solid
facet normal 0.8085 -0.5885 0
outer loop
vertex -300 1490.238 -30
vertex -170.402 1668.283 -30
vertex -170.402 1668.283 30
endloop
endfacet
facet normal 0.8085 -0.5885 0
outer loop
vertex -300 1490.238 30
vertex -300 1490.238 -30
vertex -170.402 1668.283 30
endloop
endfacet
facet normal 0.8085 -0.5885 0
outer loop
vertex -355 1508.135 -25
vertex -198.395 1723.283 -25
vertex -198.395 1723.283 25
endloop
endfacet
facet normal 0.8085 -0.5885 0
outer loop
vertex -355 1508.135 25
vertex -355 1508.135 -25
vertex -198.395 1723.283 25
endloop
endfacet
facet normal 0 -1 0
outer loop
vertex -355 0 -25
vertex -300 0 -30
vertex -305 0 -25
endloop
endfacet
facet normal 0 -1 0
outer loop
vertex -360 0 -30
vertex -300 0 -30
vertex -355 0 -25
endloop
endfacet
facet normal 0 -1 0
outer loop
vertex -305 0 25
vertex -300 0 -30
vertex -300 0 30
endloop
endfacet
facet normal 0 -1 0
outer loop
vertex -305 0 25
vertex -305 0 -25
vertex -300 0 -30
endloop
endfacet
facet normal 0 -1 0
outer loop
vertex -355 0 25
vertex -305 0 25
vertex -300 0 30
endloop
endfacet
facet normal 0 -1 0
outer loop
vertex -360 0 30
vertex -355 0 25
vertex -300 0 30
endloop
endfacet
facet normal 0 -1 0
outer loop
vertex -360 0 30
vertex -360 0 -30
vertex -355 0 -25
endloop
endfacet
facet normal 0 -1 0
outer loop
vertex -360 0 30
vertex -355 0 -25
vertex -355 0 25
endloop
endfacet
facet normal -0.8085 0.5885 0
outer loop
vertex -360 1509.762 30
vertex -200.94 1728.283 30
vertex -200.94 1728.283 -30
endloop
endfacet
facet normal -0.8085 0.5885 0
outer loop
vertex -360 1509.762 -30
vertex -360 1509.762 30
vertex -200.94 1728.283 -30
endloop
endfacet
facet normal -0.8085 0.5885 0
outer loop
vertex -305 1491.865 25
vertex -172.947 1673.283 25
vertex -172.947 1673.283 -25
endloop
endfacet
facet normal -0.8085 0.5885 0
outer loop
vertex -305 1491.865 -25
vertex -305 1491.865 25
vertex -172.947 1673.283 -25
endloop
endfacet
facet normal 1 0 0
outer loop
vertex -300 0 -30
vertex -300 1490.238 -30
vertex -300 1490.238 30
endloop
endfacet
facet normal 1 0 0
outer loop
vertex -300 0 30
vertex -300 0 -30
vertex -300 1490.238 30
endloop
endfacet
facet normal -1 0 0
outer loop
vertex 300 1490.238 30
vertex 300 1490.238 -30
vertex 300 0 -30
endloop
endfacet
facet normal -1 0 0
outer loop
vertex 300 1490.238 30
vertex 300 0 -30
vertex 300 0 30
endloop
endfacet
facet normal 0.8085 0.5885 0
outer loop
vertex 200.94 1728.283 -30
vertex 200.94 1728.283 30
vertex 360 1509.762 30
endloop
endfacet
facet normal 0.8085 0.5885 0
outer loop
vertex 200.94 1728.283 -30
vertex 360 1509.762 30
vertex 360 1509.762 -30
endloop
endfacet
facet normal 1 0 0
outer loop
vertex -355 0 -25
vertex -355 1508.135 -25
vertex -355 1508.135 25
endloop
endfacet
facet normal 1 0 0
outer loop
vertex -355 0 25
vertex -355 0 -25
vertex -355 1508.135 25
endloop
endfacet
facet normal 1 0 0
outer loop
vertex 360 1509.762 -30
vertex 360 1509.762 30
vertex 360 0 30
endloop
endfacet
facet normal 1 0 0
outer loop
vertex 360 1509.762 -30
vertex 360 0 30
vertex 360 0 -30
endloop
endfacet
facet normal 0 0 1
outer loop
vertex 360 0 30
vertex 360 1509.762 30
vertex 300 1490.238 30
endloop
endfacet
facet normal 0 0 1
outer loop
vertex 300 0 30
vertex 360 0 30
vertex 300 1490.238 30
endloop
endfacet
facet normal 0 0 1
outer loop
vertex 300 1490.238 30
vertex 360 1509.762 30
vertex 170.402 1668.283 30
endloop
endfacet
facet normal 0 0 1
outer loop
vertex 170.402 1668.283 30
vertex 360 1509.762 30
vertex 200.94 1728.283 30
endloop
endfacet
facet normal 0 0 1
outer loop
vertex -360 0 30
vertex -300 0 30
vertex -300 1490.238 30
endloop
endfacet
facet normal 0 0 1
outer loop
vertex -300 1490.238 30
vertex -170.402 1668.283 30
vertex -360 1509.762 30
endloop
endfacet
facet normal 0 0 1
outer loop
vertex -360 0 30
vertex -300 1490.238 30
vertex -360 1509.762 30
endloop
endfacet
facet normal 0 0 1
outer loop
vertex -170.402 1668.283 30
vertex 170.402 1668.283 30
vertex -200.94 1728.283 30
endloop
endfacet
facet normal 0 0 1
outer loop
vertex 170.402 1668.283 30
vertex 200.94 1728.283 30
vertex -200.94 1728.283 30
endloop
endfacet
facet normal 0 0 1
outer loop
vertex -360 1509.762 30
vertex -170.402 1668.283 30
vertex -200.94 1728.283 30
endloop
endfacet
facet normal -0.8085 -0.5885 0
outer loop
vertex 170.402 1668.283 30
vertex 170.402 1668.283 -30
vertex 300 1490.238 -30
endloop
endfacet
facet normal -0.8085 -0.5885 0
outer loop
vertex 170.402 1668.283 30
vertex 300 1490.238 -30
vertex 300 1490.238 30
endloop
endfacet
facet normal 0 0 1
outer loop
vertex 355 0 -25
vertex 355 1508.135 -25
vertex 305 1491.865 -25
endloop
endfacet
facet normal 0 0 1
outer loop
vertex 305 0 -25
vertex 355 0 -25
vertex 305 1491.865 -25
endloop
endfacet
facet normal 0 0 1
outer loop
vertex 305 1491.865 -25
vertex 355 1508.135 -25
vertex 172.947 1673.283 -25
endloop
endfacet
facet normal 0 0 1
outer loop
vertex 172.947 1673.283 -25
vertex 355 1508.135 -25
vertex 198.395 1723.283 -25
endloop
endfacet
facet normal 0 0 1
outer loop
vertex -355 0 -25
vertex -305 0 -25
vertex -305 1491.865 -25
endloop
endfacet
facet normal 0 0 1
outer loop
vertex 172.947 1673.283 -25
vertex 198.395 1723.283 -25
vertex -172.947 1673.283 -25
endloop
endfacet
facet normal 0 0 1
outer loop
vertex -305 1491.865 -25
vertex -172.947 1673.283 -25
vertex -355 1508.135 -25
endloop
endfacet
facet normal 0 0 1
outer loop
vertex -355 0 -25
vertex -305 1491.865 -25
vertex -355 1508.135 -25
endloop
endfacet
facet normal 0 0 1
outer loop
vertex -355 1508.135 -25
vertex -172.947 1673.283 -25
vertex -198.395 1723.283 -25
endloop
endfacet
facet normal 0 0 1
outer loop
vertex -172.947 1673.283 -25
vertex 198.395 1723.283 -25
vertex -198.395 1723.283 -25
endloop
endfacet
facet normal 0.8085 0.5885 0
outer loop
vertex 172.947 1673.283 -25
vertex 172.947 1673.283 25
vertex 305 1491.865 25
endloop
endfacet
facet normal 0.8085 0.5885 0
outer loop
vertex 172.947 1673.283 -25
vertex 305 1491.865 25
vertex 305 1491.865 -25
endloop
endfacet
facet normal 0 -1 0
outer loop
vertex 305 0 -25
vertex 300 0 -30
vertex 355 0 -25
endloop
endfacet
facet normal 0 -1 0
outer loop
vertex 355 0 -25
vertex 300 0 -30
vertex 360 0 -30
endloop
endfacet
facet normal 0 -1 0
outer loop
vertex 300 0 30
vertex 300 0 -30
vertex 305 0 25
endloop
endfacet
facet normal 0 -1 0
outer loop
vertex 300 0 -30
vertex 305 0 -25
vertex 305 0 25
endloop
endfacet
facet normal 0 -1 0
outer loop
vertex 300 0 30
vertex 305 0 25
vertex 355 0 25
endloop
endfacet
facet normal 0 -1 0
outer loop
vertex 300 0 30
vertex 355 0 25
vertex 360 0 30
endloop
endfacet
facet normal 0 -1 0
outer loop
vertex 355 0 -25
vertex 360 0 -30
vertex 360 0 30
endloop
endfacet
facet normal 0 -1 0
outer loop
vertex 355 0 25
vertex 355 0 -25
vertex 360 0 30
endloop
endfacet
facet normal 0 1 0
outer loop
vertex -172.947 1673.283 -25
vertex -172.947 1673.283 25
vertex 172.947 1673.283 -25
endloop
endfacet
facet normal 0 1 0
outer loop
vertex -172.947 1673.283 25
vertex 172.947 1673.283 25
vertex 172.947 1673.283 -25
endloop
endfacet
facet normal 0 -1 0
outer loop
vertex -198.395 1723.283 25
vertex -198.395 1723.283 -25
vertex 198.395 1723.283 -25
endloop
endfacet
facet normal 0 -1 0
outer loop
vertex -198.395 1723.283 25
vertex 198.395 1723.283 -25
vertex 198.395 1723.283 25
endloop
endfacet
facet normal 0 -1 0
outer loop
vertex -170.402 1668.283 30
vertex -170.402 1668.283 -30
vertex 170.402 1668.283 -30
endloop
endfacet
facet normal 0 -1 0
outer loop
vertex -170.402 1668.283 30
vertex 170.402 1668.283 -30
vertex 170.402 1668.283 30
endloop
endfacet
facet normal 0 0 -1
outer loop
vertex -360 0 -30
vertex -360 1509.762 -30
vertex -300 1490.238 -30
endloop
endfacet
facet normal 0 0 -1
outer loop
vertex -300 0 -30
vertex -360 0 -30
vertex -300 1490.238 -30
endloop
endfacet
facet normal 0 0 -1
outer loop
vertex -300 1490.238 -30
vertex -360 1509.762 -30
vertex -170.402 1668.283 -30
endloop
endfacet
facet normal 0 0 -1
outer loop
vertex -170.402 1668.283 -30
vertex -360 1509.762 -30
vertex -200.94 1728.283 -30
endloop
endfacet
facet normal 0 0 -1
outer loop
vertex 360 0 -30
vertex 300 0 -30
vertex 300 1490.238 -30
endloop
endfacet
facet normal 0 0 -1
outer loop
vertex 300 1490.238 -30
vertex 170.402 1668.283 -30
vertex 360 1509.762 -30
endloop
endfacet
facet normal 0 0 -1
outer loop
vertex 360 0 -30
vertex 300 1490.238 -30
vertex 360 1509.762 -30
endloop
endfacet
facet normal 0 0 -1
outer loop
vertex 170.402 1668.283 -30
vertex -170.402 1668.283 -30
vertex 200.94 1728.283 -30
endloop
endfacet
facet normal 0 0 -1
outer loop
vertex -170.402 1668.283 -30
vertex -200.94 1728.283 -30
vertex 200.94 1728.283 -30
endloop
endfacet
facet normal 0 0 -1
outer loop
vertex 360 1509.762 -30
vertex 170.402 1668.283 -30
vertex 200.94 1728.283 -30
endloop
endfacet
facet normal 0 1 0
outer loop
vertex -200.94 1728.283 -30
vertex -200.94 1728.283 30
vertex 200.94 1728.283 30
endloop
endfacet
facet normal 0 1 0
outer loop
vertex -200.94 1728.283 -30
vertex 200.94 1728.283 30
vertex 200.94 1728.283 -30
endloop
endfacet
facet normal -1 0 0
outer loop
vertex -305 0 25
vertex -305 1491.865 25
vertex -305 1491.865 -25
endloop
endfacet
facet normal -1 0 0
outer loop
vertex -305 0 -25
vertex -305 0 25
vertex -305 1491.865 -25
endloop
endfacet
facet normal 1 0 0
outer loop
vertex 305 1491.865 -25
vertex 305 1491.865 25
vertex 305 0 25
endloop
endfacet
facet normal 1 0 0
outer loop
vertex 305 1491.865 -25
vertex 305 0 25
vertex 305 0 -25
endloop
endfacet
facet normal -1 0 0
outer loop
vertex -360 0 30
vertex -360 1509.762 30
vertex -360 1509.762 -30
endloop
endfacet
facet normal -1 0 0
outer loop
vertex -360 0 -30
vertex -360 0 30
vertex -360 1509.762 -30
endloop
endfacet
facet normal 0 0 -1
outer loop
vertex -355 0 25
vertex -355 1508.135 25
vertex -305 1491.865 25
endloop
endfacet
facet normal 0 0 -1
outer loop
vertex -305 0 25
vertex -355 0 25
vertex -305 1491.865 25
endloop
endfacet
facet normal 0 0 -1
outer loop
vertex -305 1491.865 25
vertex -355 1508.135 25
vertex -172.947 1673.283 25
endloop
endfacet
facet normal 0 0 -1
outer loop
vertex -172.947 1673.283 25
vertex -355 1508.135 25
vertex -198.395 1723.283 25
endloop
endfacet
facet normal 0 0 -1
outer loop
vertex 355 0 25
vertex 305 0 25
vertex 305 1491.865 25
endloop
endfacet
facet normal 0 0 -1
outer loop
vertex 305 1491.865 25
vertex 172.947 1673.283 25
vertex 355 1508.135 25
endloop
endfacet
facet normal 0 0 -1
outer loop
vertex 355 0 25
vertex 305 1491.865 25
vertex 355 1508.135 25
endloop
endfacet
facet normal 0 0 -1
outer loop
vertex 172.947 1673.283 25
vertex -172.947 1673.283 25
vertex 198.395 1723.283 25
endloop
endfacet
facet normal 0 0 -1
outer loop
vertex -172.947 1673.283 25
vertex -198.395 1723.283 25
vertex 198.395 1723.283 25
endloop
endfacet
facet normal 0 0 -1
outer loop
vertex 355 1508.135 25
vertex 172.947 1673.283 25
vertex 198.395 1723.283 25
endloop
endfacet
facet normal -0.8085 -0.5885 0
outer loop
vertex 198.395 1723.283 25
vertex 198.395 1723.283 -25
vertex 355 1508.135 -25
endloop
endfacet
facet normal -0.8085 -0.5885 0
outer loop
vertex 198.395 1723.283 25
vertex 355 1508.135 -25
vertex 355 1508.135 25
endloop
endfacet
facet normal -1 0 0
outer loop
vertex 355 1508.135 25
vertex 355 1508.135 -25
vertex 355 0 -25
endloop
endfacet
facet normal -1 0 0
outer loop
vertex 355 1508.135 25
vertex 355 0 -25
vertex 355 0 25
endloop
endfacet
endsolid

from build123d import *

# Parameters (mm, degrees)
SKETCH2_W   = 60
SKETCH2_H   = 60
SKETCH2_W_2 = 50
SKETCH2_H_2 = 50


with BuildPart() as part:
    # Sweep1: sweep along a path in Sketch1
    with BuildLine(Plane.XY) as sweep1_path:
        Line((330, 0), (330, 1500))
        Line((330, 1500), (185.671137026, 1698.283381924))
        Line((185.671137026, 1698.283381924), (0, 1698.283381924))
    # Sketch2 → Sweep1 (sweep)
    with BuildSketch(Plane(origin=(0, 0, 0), x_dir=(1, 0, 0), z_dir=(0, 1, 0))):
        with Locations((330, 0)):
            Rectangle(SKETCH2_W, SKETCH2_H)
        with Locations((330, 0)):
            Rectangle(SKETCH2_W_2, SKETCH2_H_2, mode=Mode.SUBTRACT)
    sweep1 = sweep(path=sweep1_path.line, transition=Transition.RIGHT)

    # Mirror1: Sweep1 across plane
    add(sweep1.mirror(Plane(origin=(0, 0, 0), x_dir=(0, 0, 1), z_dir=(1, 0, 0))))


solid = part.part
